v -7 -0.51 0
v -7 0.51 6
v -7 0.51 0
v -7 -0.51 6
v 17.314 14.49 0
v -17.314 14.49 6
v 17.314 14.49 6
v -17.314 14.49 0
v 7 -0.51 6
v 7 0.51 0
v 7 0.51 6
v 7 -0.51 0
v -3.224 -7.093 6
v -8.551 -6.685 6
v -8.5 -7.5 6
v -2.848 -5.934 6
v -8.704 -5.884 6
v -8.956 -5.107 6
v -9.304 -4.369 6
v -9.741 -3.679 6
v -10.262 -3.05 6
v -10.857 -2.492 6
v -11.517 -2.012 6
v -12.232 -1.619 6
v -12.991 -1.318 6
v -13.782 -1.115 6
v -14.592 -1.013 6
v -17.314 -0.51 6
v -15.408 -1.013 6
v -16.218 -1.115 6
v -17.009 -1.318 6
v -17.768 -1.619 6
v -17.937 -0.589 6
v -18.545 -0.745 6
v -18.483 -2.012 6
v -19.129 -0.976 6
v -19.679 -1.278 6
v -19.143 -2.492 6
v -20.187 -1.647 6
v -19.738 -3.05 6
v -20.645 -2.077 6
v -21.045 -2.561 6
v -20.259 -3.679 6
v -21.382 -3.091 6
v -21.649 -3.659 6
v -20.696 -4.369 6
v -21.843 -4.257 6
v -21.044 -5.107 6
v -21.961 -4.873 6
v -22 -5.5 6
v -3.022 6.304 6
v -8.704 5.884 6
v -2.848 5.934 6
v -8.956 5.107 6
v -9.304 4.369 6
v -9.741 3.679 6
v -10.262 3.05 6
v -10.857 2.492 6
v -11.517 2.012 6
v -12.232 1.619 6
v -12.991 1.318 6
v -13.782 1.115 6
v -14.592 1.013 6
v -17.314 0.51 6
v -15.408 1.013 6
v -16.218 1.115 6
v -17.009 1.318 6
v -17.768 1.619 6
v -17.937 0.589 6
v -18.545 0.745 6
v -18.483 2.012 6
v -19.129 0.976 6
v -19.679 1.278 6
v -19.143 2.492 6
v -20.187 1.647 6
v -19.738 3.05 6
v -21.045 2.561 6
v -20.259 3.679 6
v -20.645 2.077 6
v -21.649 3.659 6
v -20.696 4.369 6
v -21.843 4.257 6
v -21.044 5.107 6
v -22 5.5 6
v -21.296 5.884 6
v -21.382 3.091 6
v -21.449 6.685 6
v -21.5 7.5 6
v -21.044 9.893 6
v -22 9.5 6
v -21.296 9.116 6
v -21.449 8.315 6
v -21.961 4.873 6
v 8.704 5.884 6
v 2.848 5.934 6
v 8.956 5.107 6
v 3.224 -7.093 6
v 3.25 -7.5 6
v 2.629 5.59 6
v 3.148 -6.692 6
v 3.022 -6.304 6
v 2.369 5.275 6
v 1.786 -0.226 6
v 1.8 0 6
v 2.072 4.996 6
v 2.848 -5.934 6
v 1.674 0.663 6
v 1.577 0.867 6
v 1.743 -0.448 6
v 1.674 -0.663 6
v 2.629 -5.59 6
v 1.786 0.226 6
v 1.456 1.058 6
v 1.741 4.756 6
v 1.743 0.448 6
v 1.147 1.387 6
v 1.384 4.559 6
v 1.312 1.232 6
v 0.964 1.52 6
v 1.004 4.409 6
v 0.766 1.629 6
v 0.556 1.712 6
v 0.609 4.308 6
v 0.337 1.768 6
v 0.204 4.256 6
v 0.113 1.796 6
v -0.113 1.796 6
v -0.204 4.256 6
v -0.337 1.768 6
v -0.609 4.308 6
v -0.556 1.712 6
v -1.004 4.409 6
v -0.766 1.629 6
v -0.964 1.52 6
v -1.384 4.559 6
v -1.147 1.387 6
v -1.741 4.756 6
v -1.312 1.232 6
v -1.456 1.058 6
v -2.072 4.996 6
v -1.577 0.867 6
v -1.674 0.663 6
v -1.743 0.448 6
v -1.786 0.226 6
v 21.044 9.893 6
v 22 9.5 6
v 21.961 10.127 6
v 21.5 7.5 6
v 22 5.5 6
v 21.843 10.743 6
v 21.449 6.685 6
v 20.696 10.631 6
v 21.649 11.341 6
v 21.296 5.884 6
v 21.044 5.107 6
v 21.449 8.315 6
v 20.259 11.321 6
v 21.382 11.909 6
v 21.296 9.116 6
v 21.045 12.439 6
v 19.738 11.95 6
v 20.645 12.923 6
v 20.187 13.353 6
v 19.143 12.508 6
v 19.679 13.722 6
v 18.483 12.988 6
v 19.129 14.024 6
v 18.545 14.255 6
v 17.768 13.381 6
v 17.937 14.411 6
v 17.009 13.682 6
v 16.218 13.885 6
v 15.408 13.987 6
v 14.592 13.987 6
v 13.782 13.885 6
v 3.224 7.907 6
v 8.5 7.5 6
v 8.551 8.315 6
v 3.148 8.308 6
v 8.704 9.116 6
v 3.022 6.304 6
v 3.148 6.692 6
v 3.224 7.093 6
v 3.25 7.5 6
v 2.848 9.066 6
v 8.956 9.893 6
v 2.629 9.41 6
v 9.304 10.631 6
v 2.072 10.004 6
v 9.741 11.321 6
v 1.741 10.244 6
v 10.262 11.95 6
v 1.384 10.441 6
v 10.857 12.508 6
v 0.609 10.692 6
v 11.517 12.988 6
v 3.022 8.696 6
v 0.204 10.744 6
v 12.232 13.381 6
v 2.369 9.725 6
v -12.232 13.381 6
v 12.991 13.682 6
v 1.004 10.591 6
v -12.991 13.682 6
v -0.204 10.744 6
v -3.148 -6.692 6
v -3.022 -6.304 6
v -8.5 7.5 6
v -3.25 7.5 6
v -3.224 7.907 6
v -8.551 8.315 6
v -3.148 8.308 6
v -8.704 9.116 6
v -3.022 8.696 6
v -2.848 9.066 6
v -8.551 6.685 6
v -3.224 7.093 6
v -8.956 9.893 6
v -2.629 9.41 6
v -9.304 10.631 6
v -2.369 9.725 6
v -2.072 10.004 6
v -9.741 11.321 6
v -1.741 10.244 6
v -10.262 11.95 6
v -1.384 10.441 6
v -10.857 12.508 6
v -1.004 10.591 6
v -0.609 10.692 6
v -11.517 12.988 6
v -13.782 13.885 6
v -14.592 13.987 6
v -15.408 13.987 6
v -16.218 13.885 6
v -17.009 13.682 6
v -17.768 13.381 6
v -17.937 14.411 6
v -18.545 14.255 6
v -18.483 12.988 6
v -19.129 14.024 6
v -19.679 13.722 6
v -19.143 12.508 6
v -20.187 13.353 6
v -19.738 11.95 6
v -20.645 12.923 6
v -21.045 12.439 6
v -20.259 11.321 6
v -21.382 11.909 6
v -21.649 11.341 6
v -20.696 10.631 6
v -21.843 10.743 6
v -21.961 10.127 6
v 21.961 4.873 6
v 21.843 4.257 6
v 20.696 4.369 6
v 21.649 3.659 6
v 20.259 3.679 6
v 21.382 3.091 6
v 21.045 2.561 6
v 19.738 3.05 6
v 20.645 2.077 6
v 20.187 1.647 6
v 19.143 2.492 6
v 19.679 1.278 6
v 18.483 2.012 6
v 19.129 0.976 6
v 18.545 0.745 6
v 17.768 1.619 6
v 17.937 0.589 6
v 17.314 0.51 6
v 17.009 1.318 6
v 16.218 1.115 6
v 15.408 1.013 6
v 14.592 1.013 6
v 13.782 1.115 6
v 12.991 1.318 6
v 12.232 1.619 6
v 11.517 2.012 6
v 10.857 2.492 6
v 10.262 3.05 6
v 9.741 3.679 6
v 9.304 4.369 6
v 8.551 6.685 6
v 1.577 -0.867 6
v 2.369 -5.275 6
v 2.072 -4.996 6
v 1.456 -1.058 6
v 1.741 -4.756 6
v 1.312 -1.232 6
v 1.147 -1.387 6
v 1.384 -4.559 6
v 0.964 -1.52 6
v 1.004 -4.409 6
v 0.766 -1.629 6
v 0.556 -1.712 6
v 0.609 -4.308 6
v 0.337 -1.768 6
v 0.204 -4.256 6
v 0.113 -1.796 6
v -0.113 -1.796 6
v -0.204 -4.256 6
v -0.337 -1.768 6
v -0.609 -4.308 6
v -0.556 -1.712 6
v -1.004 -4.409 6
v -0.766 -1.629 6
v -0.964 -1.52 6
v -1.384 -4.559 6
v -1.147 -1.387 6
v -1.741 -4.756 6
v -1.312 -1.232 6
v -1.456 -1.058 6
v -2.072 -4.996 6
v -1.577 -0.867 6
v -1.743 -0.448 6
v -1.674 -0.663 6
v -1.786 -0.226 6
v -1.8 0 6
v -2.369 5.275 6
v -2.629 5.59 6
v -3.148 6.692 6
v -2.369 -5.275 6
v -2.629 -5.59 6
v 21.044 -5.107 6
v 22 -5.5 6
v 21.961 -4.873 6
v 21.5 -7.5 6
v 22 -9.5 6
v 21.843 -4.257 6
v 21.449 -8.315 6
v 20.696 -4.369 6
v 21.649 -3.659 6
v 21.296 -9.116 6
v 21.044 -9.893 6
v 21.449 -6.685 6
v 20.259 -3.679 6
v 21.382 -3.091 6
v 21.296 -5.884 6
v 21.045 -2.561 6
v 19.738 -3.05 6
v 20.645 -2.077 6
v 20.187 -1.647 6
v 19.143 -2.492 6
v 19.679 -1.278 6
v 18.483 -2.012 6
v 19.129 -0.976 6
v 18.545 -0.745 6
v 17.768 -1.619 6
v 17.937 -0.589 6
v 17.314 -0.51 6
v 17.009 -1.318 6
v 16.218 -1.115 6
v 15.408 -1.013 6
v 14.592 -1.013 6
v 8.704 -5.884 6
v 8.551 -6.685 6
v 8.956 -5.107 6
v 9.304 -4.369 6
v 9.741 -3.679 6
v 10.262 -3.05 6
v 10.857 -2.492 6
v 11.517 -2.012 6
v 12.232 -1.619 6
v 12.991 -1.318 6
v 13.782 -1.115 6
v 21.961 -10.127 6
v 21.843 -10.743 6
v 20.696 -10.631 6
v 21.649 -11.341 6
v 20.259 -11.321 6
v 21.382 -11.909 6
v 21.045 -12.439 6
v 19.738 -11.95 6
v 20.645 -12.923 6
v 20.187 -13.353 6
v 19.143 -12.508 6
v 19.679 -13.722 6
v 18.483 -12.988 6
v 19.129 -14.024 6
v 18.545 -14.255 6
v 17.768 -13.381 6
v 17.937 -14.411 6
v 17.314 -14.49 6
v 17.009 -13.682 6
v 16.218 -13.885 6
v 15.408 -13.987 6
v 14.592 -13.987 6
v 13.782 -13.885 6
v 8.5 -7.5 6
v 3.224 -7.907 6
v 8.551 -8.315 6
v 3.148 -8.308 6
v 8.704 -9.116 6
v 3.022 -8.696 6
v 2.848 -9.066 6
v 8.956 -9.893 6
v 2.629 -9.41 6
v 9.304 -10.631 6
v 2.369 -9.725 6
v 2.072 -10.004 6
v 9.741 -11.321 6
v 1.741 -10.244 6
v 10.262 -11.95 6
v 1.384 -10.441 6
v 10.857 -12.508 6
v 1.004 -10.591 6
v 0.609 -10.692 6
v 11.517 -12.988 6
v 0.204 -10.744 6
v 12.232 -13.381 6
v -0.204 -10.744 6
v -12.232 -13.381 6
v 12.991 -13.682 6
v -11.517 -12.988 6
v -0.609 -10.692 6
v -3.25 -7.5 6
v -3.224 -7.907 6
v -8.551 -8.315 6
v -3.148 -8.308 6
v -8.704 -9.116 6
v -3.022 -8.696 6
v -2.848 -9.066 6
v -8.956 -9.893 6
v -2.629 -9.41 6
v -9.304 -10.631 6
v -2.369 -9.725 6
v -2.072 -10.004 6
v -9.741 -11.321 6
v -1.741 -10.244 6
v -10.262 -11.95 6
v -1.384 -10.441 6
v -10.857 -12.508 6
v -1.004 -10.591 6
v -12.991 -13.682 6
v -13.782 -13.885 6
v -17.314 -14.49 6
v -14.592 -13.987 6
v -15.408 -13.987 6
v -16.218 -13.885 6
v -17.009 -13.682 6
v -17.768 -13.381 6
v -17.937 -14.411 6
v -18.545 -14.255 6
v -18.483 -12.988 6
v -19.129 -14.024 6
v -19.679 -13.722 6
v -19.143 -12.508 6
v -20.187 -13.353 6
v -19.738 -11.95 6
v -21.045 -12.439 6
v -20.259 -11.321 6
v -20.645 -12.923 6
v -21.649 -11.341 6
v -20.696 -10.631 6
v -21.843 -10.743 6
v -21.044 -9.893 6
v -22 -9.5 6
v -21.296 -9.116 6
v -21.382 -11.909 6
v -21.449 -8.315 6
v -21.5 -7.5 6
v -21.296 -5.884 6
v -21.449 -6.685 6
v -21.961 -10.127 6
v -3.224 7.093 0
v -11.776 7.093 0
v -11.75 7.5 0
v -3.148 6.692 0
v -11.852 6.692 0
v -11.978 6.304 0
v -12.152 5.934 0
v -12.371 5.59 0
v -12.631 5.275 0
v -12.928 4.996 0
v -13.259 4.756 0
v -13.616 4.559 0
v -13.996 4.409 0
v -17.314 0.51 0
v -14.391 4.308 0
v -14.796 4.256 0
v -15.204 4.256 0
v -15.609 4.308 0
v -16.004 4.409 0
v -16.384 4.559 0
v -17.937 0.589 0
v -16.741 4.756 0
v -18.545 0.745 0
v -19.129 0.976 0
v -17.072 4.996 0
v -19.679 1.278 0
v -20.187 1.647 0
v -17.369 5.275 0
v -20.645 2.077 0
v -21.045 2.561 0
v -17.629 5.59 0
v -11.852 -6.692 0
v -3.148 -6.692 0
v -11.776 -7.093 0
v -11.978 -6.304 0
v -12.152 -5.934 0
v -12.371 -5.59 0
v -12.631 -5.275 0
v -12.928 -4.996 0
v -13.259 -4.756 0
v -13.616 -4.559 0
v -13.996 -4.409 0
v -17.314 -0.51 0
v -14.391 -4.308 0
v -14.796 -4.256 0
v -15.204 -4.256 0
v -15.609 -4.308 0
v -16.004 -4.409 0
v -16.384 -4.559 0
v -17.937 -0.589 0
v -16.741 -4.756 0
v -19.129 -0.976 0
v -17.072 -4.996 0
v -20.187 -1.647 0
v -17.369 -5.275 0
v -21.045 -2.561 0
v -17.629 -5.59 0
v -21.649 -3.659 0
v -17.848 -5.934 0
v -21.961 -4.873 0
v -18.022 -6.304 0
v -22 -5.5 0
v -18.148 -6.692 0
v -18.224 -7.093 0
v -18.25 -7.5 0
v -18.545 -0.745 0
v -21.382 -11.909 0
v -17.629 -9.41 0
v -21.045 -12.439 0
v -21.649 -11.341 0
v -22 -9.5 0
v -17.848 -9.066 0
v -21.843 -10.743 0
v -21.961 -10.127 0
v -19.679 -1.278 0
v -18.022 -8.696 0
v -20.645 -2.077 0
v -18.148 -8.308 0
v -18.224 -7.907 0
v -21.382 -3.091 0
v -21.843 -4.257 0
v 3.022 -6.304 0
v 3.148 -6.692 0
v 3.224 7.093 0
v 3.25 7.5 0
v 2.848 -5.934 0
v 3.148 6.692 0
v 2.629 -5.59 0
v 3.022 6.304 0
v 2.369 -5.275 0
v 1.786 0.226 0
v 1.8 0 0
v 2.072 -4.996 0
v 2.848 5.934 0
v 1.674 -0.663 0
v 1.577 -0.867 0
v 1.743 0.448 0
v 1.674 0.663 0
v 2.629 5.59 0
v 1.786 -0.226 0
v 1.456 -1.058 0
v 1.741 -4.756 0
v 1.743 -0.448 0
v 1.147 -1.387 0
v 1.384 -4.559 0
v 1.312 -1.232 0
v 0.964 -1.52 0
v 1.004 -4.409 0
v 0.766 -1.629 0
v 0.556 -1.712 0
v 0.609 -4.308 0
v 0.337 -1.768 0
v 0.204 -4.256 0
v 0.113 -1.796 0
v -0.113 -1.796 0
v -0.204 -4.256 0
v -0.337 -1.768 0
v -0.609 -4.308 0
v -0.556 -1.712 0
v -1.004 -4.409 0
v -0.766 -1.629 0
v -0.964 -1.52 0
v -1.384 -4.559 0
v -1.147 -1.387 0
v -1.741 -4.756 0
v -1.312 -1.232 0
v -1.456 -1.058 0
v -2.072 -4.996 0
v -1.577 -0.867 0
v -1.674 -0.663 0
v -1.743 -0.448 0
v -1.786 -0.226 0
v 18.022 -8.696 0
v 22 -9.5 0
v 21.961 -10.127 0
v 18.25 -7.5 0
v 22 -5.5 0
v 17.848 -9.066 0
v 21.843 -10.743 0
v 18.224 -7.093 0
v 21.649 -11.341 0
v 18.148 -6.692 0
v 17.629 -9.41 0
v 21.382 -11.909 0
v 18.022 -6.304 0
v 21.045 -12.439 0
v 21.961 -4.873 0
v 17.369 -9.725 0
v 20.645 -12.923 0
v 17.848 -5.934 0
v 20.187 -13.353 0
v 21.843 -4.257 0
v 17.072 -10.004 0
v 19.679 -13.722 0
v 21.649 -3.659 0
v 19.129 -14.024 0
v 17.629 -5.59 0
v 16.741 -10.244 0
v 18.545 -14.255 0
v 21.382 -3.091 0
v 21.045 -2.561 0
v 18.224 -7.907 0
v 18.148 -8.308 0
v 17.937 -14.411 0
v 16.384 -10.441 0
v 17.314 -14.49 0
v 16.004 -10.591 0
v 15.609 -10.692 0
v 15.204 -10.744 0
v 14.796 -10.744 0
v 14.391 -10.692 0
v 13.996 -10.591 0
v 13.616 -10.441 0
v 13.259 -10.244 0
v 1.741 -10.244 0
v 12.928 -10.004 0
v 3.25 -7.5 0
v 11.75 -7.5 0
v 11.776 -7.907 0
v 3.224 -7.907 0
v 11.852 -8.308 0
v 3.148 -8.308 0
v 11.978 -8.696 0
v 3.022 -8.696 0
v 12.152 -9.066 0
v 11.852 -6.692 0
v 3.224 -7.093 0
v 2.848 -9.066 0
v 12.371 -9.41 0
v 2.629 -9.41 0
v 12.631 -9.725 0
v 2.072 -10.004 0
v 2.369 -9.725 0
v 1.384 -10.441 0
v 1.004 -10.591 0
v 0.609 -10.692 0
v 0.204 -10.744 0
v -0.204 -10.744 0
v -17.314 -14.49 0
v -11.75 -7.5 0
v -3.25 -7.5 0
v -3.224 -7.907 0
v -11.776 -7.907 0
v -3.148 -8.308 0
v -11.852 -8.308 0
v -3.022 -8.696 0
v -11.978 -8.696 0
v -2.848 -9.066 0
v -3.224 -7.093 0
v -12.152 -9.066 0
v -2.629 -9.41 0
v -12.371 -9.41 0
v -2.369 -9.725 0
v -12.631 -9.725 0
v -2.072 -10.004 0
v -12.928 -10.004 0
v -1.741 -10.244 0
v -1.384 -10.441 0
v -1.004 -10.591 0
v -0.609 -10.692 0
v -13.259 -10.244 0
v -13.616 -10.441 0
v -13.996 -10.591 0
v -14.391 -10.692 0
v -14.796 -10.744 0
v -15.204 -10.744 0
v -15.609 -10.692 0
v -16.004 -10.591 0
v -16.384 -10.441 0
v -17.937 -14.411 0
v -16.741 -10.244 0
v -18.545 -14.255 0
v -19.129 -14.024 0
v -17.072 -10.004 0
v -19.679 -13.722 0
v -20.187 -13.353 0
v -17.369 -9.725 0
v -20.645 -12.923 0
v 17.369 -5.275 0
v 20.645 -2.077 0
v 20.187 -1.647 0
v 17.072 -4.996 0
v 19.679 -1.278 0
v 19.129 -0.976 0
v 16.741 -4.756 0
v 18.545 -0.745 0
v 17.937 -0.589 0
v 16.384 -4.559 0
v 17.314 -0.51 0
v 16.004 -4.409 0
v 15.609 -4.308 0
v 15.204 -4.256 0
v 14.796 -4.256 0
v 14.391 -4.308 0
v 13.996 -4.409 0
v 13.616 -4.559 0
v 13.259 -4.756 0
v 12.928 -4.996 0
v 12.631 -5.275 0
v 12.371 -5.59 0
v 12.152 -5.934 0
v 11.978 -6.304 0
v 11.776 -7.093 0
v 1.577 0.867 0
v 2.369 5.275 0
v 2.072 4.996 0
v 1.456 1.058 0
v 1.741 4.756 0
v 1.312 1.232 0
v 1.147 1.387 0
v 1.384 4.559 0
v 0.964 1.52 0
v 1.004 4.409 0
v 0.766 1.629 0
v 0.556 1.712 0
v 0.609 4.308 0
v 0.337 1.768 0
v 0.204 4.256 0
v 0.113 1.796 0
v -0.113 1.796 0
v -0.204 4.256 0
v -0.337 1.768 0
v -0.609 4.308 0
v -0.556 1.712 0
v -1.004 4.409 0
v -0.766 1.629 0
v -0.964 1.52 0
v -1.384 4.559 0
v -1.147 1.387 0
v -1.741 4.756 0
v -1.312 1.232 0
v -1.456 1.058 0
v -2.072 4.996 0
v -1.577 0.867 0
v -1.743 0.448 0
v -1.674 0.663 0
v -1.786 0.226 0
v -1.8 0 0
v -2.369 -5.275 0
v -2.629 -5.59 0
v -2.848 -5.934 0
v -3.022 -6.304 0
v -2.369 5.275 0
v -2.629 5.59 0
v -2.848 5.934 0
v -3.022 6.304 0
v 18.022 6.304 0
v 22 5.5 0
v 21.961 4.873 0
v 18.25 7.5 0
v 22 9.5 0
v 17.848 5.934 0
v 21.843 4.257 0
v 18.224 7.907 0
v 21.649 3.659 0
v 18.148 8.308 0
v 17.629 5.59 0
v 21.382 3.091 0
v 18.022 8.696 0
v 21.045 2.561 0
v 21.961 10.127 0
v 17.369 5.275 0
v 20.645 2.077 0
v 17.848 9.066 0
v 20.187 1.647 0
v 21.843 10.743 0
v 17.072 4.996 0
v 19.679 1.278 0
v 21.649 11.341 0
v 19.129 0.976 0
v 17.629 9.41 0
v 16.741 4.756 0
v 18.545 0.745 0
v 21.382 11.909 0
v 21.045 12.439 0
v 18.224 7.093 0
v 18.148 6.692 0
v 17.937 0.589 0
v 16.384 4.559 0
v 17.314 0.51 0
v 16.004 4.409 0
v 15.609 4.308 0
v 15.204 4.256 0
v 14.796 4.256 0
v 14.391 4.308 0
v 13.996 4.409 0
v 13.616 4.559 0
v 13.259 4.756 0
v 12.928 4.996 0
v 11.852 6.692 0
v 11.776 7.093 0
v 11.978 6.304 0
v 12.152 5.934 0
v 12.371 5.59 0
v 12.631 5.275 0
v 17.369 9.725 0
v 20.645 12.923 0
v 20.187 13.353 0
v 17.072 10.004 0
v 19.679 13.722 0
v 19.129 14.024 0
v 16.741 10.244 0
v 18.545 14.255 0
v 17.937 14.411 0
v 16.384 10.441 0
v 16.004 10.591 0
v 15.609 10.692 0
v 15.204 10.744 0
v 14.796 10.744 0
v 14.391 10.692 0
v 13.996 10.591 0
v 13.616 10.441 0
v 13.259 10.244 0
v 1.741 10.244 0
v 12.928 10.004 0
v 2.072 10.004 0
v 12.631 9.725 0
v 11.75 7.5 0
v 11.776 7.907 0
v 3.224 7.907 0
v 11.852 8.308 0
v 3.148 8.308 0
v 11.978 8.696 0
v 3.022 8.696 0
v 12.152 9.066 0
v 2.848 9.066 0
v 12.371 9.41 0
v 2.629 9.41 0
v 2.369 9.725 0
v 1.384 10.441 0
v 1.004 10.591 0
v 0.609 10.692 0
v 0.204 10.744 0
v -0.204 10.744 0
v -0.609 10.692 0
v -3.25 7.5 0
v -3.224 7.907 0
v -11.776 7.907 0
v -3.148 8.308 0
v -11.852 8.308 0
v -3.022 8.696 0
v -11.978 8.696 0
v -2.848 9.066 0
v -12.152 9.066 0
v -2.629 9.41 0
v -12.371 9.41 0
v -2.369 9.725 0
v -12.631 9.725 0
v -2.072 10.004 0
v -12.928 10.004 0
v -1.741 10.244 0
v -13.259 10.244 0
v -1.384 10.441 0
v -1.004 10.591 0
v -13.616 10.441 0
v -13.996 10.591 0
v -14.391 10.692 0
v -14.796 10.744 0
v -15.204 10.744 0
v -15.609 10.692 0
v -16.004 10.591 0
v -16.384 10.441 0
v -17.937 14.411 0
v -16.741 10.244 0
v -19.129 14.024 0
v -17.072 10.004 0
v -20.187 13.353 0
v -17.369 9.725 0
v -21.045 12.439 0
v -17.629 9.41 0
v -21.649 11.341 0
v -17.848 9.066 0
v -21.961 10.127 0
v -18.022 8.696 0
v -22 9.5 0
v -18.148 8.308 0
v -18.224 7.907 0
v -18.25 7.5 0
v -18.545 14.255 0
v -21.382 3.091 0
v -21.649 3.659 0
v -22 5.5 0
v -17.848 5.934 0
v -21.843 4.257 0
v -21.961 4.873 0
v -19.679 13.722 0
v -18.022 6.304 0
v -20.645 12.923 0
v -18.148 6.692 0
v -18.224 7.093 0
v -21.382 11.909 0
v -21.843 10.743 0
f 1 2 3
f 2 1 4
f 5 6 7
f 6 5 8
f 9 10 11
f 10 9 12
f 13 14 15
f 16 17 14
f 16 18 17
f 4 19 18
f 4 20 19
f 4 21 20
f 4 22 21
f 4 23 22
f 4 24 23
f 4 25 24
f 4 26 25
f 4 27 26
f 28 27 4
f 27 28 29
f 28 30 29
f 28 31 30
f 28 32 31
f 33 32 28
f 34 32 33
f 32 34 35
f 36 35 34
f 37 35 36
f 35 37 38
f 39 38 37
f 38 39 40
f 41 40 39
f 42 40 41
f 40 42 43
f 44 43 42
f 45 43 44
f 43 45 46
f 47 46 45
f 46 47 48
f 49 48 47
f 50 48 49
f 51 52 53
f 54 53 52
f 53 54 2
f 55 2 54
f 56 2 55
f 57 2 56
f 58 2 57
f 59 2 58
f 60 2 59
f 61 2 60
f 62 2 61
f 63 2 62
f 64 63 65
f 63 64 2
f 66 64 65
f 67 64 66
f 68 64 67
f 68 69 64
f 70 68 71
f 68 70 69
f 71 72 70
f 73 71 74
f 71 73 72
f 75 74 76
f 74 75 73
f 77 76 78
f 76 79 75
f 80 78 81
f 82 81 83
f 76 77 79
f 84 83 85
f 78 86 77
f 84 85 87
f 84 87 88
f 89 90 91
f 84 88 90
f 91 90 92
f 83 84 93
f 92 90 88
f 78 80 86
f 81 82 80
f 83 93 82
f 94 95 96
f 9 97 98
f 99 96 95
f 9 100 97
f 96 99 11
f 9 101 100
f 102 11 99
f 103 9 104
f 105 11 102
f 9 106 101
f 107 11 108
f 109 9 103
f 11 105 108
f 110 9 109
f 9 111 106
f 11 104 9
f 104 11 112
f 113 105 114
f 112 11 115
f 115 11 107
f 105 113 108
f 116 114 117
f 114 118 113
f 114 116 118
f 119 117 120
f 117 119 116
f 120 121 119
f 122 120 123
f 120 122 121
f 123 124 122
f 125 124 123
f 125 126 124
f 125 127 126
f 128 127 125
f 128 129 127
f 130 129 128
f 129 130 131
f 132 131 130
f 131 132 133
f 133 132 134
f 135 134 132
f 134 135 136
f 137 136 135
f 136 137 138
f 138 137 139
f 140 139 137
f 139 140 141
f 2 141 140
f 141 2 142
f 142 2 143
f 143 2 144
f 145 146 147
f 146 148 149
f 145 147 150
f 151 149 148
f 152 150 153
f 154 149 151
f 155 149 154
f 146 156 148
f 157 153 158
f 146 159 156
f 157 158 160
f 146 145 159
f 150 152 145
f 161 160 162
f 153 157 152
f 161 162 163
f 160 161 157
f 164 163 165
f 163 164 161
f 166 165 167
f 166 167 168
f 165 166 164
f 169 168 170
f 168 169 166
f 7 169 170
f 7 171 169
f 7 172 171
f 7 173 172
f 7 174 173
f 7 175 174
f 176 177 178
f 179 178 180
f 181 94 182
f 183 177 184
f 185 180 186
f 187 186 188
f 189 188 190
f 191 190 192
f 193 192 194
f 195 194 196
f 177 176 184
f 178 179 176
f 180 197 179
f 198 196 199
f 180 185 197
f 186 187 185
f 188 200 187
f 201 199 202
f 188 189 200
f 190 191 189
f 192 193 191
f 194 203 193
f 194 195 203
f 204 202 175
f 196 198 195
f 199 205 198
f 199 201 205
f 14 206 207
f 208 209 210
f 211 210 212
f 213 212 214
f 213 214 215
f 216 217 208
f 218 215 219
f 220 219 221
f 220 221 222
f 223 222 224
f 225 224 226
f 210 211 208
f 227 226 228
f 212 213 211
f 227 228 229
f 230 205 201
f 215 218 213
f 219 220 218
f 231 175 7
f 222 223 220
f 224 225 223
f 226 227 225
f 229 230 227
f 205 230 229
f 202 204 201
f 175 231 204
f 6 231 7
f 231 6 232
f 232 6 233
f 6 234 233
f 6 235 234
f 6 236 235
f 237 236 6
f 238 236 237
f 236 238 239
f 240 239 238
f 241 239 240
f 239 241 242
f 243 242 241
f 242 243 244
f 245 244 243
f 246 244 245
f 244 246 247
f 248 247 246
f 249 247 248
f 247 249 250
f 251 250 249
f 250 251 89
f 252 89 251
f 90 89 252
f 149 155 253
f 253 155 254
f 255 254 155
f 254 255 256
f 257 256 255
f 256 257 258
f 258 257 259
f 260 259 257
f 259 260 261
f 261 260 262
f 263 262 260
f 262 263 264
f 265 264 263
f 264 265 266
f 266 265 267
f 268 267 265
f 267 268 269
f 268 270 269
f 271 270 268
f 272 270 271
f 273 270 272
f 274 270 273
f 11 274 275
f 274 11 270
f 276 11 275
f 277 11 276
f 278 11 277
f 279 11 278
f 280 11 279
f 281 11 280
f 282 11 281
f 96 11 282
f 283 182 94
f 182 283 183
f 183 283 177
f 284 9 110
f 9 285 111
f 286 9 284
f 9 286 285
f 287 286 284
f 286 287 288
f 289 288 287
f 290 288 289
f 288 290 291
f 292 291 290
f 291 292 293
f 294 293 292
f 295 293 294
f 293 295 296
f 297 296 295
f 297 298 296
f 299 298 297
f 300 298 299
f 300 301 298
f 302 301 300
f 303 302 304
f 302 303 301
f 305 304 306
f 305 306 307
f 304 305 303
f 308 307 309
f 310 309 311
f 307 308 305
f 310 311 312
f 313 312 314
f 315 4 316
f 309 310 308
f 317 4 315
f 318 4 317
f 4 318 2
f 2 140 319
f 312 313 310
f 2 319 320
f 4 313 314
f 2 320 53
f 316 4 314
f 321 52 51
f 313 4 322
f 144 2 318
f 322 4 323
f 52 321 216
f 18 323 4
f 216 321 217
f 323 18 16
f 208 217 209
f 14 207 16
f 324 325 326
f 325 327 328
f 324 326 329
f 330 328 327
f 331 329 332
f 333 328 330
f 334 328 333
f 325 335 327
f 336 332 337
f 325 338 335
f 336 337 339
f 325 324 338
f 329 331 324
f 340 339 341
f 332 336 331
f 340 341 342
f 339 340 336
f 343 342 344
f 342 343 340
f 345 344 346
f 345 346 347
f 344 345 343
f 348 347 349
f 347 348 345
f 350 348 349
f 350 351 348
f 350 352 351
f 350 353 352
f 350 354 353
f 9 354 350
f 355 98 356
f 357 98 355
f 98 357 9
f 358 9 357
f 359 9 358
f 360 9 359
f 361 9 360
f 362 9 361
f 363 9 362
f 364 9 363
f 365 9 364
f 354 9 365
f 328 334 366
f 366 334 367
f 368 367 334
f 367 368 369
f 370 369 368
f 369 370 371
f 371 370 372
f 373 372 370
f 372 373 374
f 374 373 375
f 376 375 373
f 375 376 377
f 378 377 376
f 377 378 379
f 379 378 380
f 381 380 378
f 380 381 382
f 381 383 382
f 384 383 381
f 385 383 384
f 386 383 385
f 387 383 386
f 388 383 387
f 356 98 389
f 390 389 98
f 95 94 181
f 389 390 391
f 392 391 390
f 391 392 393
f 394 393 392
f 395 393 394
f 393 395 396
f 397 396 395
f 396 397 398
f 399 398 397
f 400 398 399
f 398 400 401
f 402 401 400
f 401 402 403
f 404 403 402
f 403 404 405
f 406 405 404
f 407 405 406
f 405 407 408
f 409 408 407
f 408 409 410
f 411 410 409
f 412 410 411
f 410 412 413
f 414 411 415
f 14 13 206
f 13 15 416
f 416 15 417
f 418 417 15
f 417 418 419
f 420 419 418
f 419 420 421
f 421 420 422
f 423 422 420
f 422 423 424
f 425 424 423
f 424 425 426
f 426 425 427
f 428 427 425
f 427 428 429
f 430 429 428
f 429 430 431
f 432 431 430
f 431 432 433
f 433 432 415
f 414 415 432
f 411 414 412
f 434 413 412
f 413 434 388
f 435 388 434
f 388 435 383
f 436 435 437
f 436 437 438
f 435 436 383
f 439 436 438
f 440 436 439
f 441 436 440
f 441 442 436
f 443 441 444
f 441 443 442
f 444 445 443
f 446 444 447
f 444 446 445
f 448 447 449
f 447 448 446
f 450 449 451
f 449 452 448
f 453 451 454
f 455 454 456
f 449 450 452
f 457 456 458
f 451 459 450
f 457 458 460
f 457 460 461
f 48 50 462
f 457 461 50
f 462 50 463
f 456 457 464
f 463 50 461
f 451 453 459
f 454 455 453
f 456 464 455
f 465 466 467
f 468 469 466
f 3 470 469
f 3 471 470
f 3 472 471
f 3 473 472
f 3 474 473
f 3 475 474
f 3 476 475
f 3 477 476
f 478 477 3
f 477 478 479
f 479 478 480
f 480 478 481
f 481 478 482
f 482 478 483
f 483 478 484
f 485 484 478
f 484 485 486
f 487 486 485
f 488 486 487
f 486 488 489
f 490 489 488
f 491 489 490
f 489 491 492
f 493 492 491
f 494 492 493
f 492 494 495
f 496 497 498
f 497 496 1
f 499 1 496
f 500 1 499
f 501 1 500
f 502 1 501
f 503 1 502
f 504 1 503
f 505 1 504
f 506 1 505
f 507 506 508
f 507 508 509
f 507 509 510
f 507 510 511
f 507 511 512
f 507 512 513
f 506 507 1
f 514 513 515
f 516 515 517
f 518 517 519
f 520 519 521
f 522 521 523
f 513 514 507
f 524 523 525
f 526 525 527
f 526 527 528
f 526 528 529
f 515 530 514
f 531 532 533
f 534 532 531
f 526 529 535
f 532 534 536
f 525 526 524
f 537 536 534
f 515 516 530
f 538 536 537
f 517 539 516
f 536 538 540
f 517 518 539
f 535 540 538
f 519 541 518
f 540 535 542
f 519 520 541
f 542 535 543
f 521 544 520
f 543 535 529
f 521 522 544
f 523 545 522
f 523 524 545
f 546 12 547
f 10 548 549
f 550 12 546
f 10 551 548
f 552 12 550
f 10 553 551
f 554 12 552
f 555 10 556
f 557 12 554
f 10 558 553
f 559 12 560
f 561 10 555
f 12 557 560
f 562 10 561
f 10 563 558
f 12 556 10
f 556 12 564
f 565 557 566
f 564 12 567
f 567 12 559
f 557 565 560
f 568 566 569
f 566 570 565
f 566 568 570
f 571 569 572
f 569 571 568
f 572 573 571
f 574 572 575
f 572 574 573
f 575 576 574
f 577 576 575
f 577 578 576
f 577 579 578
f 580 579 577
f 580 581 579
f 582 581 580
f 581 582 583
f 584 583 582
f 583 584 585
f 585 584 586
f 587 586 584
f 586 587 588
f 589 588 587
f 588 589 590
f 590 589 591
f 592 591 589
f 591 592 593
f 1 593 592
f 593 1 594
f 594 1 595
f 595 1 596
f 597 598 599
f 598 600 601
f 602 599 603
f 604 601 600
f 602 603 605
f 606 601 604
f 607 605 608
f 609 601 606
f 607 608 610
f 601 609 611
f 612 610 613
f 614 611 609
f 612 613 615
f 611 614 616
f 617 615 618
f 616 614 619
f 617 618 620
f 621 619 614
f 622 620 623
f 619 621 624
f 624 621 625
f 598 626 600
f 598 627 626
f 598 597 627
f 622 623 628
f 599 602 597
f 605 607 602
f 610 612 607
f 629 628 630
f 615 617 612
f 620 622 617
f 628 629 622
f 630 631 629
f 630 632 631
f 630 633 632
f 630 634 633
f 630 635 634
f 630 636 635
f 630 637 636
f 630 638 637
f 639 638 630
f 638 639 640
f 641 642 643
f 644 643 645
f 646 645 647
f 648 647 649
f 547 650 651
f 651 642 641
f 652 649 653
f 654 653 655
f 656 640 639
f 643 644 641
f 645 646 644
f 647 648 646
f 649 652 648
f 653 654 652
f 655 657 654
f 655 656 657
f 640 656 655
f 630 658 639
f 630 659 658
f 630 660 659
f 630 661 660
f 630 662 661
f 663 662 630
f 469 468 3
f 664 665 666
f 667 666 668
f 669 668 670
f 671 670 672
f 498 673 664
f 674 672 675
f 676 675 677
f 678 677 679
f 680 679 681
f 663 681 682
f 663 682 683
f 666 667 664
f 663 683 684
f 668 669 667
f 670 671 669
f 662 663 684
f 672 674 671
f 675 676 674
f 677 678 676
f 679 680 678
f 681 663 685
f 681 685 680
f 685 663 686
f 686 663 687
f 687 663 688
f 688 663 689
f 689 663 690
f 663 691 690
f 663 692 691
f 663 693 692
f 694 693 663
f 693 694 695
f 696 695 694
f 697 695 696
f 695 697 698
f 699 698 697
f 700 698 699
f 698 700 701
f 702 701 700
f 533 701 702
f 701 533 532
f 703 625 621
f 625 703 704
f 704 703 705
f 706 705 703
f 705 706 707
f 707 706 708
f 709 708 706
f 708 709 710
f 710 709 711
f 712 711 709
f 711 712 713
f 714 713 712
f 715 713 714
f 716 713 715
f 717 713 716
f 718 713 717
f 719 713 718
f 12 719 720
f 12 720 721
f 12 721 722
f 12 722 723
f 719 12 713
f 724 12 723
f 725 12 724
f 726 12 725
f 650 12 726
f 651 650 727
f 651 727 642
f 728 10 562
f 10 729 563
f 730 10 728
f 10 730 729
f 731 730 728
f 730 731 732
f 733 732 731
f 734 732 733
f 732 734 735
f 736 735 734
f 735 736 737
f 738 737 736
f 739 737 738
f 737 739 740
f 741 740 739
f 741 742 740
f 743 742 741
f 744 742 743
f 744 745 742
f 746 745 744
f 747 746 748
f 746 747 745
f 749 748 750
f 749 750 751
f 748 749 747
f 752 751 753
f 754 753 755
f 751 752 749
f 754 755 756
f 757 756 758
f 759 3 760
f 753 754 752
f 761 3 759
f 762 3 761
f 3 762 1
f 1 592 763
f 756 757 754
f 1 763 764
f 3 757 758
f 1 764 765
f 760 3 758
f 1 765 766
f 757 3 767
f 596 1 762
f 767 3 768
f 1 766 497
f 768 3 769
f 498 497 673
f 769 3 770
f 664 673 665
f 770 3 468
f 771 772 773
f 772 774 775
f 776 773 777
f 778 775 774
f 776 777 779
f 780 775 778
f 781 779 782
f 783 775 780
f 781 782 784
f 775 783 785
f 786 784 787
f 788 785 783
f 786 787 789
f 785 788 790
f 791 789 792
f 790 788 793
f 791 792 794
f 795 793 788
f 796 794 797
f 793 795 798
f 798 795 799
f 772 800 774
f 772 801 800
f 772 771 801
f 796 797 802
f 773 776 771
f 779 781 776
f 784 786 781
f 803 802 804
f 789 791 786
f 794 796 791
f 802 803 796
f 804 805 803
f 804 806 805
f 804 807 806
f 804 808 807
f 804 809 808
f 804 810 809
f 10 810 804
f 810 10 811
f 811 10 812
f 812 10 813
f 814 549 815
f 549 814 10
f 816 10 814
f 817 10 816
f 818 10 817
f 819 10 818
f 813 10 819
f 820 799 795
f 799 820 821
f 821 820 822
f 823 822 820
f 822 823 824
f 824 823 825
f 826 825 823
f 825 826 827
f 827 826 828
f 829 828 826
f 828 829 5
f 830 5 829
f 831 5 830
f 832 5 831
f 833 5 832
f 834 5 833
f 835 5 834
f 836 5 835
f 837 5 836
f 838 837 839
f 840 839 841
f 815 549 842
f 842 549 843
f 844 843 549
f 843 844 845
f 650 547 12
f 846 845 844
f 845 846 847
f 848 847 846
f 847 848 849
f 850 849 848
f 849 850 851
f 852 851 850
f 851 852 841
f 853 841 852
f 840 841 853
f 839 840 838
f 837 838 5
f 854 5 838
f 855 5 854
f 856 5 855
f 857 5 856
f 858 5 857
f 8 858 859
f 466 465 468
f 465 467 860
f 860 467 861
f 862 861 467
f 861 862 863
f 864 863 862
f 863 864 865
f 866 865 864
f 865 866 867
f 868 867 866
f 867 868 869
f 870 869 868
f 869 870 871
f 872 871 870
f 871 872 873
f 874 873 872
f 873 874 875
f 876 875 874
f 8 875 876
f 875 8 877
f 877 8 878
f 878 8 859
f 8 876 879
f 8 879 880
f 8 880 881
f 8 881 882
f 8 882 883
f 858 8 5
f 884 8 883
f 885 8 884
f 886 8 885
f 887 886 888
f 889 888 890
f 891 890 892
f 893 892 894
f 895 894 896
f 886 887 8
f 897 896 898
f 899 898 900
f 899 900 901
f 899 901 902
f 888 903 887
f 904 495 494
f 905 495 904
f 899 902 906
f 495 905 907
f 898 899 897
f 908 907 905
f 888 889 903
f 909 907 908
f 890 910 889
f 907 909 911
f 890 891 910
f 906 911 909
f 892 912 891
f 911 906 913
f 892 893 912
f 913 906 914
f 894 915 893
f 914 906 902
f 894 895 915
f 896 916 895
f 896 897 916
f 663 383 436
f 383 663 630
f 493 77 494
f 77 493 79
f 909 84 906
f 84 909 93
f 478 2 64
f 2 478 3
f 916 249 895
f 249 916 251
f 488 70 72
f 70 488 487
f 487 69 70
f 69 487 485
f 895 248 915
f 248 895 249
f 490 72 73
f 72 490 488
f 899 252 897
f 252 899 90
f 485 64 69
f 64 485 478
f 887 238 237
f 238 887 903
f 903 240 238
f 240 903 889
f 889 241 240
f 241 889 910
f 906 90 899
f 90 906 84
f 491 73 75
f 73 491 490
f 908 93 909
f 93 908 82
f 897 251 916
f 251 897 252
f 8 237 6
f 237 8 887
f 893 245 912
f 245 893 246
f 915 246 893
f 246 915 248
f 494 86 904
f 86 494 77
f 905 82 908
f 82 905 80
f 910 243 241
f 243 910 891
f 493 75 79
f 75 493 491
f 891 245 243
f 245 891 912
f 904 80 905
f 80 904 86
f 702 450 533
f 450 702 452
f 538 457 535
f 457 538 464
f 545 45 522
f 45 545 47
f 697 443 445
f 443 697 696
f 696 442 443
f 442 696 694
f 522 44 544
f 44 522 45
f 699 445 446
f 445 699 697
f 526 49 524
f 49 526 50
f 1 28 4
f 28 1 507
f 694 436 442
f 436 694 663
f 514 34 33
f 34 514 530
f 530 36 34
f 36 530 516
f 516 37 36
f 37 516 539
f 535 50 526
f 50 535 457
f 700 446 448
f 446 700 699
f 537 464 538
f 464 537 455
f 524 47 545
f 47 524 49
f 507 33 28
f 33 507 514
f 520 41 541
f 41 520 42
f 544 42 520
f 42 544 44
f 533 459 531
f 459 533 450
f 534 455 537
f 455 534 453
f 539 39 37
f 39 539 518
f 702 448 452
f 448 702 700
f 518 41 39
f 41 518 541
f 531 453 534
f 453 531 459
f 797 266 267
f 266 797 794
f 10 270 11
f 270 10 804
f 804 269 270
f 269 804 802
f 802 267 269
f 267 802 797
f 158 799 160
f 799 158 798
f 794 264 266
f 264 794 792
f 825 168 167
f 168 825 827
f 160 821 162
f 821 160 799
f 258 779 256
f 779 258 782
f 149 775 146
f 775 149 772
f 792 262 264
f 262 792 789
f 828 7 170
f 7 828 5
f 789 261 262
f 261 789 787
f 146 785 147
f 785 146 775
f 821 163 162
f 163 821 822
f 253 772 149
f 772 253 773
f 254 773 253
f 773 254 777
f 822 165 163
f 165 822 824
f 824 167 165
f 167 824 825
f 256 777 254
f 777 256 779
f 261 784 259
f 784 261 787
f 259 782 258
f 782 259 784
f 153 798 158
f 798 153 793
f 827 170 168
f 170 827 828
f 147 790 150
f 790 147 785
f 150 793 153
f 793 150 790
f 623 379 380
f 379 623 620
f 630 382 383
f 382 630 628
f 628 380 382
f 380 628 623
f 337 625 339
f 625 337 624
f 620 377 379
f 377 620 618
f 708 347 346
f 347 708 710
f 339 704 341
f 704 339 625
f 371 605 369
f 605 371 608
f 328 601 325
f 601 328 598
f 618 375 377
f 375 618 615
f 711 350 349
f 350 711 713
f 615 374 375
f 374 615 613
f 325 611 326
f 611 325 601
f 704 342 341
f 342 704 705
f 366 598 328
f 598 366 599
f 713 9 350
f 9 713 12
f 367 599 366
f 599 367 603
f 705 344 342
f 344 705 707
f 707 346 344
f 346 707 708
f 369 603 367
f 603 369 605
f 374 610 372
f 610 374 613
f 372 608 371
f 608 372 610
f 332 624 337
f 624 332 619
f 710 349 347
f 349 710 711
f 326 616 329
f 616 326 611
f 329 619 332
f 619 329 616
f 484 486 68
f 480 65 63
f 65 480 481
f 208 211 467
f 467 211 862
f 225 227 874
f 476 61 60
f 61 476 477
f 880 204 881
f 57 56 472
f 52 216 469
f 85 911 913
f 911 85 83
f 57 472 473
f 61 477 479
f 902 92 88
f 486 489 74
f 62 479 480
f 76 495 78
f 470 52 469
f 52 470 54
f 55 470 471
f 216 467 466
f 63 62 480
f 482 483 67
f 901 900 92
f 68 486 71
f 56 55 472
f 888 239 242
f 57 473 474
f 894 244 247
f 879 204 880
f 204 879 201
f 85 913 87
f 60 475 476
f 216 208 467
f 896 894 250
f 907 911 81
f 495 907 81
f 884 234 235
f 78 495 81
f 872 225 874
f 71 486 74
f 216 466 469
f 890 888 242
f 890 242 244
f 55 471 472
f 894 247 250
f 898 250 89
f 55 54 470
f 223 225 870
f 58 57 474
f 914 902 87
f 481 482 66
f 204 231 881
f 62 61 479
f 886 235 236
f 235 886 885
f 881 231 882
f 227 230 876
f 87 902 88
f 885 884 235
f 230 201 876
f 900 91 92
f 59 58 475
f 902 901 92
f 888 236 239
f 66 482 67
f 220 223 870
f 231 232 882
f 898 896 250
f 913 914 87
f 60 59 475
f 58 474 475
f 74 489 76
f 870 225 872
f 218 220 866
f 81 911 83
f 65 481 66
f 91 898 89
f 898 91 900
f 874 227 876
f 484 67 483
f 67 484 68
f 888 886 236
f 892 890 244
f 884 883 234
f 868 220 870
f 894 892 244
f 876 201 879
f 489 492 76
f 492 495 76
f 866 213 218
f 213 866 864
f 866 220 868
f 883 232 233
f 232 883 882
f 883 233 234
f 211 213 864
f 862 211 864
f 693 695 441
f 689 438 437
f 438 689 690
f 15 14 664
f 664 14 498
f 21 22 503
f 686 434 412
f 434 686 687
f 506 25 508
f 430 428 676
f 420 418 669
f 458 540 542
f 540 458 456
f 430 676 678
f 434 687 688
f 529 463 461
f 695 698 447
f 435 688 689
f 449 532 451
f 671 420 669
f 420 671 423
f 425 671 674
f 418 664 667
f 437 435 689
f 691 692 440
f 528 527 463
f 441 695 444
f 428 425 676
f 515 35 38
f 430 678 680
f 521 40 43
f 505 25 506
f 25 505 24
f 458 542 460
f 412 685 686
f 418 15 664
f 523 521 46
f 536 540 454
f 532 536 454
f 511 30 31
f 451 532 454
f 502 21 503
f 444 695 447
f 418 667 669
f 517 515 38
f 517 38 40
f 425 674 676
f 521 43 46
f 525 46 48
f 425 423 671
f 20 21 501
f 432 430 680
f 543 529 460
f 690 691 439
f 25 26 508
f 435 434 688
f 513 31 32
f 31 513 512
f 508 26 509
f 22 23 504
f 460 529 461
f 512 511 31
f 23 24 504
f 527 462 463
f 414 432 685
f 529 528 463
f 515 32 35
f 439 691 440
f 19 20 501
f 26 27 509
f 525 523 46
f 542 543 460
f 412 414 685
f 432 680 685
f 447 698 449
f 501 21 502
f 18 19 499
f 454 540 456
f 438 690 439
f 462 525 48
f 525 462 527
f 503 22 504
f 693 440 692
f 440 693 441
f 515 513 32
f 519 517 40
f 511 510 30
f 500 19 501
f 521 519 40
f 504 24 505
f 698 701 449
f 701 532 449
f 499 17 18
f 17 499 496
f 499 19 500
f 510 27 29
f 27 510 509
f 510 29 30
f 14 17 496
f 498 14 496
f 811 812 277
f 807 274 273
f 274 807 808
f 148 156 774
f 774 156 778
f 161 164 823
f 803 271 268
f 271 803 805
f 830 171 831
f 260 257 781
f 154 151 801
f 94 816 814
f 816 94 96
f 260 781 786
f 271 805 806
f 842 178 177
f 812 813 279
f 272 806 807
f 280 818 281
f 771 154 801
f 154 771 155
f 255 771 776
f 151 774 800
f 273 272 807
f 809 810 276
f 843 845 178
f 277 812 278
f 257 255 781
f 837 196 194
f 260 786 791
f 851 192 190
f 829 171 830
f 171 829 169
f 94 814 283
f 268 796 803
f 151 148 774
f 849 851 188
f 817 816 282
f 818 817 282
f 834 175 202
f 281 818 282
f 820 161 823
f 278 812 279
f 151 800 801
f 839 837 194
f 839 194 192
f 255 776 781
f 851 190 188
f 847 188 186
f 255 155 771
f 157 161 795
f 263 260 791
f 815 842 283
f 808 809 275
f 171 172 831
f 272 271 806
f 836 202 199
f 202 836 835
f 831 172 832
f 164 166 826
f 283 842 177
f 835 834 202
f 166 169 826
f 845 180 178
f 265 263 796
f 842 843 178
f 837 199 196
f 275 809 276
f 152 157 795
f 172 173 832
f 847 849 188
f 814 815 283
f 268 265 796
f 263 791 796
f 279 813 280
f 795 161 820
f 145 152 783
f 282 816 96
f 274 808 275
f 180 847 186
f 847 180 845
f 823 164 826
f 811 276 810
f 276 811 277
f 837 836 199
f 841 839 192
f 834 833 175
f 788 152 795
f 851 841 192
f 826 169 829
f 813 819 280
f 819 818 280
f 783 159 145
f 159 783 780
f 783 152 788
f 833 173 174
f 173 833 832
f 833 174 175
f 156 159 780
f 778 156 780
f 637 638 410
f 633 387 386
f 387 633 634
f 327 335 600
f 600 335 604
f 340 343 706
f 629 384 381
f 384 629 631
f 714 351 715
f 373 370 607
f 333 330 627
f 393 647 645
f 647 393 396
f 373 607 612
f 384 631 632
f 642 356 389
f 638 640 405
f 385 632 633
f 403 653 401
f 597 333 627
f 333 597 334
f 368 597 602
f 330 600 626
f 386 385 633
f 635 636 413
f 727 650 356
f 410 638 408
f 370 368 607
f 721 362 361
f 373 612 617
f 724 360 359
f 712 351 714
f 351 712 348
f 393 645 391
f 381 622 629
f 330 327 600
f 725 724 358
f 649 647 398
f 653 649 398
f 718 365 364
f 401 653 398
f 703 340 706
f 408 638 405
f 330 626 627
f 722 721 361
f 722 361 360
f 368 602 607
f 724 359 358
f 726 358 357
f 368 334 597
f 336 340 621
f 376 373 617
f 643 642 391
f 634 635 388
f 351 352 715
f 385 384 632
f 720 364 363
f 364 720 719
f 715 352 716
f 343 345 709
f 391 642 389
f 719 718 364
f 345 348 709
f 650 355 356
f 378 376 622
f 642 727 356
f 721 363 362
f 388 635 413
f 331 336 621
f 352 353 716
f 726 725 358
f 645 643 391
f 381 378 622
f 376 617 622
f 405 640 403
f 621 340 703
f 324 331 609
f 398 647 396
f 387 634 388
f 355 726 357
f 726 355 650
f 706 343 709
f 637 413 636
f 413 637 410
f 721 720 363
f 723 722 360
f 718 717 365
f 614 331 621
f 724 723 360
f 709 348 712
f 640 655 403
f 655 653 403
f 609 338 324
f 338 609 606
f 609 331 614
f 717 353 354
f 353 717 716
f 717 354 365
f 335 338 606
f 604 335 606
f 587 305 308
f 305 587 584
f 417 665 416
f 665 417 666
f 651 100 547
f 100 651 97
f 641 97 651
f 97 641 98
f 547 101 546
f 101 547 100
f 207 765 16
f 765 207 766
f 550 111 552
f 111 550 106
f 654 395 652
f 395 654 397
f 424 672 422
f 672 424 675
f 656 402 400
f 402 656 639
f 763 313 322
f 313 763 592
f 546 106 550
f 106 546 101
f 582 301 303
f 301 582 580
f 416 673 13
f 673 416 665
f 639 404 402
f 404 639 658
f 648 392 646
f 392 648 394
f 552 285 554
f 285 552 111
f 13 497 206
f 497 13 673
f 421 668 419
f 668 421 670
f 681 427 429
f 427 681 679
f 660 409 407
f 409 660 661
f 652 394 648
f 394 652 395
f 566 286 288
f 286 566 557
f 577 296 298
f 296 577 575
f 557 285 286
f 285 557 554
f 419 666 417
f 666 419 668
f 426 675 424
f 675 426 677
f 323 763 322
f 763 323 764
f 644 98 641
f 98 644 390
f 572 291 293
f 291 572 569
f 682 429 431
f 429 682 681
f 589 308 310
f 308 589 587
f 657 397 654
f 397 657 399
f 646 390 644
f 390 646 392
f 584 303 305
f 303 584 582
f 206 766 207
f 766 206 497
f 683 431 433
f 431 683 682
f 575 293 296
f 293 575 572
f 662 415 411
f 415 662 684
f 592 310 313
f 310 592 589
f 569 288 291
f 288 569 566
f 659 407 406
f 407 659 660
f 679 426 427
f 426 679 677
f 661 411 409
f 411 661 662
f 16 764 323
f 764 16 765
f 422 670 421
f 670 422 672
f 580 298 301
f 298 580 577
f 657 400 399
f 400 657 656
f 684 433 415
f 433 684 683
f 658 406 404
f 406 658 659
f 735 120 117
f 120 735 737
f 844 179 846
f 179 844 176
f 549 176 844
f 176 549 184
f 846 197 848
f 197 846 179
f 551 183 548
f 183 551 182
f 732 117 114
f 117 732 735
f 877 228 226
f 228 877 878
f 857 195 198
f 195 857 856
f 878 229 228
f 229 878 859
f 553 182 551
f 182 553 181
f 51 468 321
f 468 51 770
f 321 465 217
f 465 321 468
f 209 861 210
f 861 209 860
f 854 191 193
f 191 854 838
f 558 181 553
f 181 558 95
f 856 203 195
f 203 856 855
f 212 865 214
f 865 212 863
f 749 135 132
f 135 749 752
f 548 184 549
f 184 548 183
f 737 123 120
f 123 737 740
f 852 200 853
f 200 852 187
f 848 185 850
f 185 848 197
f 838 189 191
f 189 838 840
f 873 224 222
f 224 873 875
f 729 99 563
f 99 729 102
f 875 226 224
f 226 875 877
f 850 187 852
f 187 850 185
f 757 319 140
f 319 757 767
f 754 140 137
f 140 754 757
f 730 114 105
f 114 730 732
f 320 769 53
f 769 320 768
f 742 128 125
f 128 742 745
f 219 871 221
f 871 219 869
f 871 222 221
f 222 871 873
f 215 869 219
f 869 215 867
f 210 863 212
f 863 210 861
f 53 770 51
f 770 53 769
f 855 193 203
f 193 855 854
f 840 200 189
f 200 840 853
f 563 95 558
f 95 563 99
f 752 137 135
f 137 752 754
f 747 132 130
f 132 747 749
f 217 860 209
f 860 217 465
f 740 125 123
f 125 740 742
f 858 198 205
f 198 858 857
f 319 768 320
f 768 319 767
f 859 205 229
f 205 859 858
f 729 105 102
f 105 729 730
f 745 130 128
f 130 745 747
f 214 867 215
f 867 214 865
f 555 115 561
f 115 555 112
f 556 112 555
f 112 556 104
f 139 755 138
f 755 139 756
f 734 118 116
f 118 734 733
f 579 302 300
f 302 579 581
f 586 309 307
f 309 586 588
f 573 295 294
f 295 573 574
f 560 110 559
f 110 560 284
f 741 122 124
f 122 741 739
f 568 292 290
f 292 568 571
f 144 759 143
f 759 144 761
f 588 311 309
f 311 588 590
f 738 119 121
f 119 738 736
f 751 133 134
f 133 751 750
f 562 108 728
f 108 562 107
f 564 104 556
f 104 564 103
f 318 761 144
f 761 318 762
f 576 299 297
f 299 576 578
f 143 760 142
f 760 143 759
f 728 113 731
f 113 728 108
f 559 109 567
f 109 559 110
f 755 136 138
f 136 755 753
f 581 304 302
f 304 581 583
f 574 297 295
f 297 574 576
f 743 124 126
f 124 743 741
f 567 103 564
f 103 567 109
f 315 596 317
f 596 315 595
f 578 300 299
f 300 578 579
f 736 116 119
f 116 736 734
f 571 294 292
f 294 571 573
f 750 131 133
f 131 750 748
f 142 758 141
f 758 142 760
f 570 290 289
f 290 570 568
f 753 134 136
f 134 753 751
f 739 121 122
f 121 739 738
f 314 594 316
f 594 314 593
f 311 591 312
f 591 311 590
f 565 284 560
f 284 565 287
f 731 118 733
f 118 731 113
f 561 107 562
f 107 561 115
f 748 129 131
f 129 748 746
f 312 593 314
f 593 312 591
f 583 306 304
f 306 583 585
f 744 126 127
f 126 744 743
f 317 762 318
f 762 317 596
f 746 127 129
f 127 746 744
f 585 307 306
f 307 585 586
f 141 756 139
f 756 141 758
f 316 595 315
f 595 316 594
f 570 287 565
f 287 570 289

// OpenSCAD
$fn = 50;


difference() {
	union() {
		hull() {
			translate(v = [-2.0000000000, 9.5000000000, 0]) {
				cylinder(h = 6, r = 5);
			}
			translate(v = [2.0000000000, 9.5000000000, 0]) {
				cylinder(h = 6, r = 5);
			}
			translate(v = [-2.0000000000, -9.5000000000, 0]) {
				cylinder(h = 6, r = 5);
			}
			translate(v = [2.0000000000, -9.5000000000, 0]) {
				cylinder(h = 6, r = 5);
			}
		}
		translate(v = [-7.5000000000, 7.5000000000, 0]) {
			hull() {
				translate(v = [-9.5000000000, 2.0000000000, 0]) {
					cylinder(h = 6, r = 5);
				}
				translate(v = [9.5000000000, 2.0000000000, 0]) {
					cylinder(h = 6, r = 5);
				}
				translate(v = [-9.5000000000, -2.0000000000, 0]) {
					cylinder(h = 6, r = 5);
				}
				translate(v = [9.5000000000, -2.0000000000, 0]) {
					cylinder(h = 6, r = 5);
				}
			}
		}
		translate(v = [-7.5000000000, -7.5000000000, 0]) {
			hull() {
				translate(v = [-9.5000000000, 2.0000000000, 0]) {
					cylinder(h = 6, r = 5);
				}
				translate(v = [9.5000000000, 2.0000000000, 0]) {
					cylinder(h = 6, r = 5);
				}
				translate(v = [-9.5000000000, -2.0000000000, 0]) {
					cylinder(h = 6, r = 5);
				}
				translate(v = [9.5000000000, -2.0000000000, 0]) {
					cylinder(h = 6, r = 5);
				}
			}
		}
		translate(v = [7.5000000000, 7.5000000000, 0]) {
			hull() {
				translate(v = [-9.5000000000, 2.0000000000, 0]) {
					cylinder(h = 6, r = 5);
				}
				translate(v = [9.5000000000, 2.0000000000, 0]) {
					cylinder(h = 6, r = 5);
				}
				translate(v = [-9.5000000000, -2.0000000000, 0]) {
					cylinder(h = 6, r = 5);
				}
				translate(v = [9.5000000000, -2.0000000000, 0]) {
					cylinder(h = 6, r = 5);
				}
			}
		}
		translate(v = [7.5000000000, -7.5000000000, 0]) {
			hull() {
				translate(v = [-9.5000000000, 2.0000000000, 0]) {
					cylinder(h = 6, r = 5);
				}
				translate(v = [9.5000000000, 2.0000000000, 0]) {
					cylinder(h = 6, r = 5);
				}
				translate(v = [-9.5000000000, -2.0000000000, 0]) {
					cylinder(h = 6, r = 5);
				}
				translate(v = [9.5000000000, -2.0000000000, 0]) {
					cylinder(h = 6, r = 5);
				}
			}
		}
	}
	union() {
		translate(v = [-15.0000000000, 7.5000000000, 6]) {
			rotate(a = [0, 0, 0]) {
				difference() {
					union() {
						#translate(v = [0, 0, -6.0000000000]) {
							cylinder(h = 6, r = 2.2500000000);
						}
						#translate(v = [0, 0, -6]) {
							cylinder(h = 6, r1 = 3.2500000000, r2 = 6.5000000000);
						}
						#translate(v = [0, 0, -6.0000000000]) {
							cylinder(h = 6, r = 3.2500000000);
						}
						#translate(v = [0, 0, -6.0000000000]) {
							cylinder(h = 6, r = 2.2500000000);
						}
					}
					union();
				}
			}
		}
		translate(v = [-15.0000000000, -7.5000000000, 6]) {
			rotate(a = [0, 0, 0]) {
				difference() {
					union() {
						#translate(v = [0, 0, -6.0000000000]) {
							cylinder(h = 6, r = 2.2500000000);
						}
						#translate(v = [0, 0, -6]) {
							cylinder(h = 6, r1 = 3.2500000000, r2 = 6.5000000000);
						}
						#translate(v = [0, 0, -6.0000000000]) {
							cylinder(h = 6, r = 3.2500000000);
						}
						#translate(v = [0, 0, -6.0000000000]) {
							cylinder(h = 6, r = 2.2500000000);
						}
					}
					union();
				}
			}
		}
		translate(v = [15.0000000000, 7.5000000000, 6]) {
			rotate(a = [0, 0, 0]) {
				difference() {
					union() {
						#translate(v = [0, 0, -6.0000000000]) {
							cylinder(h = 6, r = 2.2500000000);
						}
						#translate(v = [0, 0, -6]) {
							cylinder(h = 6, r1 = 3.2500000000, r2 = 6.5000000000);
						}
						#translate(v = [0, 0, -6.0000000000]) {
							cylinder(h = 6, r = 3.2500000000);
						}
						#translate(v = [0, 0, -6.0000000000]) {
							cylinder(h = 6, r = 2.2500000000);
						}
					}
					union();
				}
			}
		}
		translate(v = [15.0000000000, -7.5000000000, 6]) {
			rotate(a = [0, 0, 0]) {
				difference() {
					union() {
						#translate(v = [0, 0, -6.0000000000]) {
							cylinder(h = 6, r = 2.2500000000);
						}
						#translate(v = [0, 0, -6]) {
							cylinder(h = 6, r1 = 3.2500000000, r2 = 6.5000000000);
						}
						#translate(v = [0, 0, -6.0000000000]) {
							cylinder(h = 6, r = 3.2500000000);
						}
						#translate(v = [0, 0, -6.0000000000]) {
							cylinder(h = 6, r = 2.2500000000);
						}
					}
					union();
				}
			}
		}
		translate(v = [0.0000000000, -7.5000000000, 0]) {
			translate(v = [0, 0, -100]) {
				cylinder(h = 200, r = 3.2500000000);
			}
		}
		translate(v = [0.0000000000, 7.5000000000, 0]) {
			translate(v = [0, 0, -100]) {
				cylinder(h = 200, r = 3.2500000000);
			}
		}
		translate(v = [0.0000000000, -7.5000000000, 0]) {
			translate(v = [0, 0, -100]) {
				cylinder(h = 200, r = 1.8000000000);
			}
		}
		translate(v = [0, 0, -100]) {
			cylinder(h = 200, r = 1.8000000000);
		}
		translate(v = [0.0000000000, 7.5000000000, 0]) {
			translate(v = [0, 0, -100]) {
				cylinder(h = 200, r = 1.8000000000);
			}
		}
	}
}
